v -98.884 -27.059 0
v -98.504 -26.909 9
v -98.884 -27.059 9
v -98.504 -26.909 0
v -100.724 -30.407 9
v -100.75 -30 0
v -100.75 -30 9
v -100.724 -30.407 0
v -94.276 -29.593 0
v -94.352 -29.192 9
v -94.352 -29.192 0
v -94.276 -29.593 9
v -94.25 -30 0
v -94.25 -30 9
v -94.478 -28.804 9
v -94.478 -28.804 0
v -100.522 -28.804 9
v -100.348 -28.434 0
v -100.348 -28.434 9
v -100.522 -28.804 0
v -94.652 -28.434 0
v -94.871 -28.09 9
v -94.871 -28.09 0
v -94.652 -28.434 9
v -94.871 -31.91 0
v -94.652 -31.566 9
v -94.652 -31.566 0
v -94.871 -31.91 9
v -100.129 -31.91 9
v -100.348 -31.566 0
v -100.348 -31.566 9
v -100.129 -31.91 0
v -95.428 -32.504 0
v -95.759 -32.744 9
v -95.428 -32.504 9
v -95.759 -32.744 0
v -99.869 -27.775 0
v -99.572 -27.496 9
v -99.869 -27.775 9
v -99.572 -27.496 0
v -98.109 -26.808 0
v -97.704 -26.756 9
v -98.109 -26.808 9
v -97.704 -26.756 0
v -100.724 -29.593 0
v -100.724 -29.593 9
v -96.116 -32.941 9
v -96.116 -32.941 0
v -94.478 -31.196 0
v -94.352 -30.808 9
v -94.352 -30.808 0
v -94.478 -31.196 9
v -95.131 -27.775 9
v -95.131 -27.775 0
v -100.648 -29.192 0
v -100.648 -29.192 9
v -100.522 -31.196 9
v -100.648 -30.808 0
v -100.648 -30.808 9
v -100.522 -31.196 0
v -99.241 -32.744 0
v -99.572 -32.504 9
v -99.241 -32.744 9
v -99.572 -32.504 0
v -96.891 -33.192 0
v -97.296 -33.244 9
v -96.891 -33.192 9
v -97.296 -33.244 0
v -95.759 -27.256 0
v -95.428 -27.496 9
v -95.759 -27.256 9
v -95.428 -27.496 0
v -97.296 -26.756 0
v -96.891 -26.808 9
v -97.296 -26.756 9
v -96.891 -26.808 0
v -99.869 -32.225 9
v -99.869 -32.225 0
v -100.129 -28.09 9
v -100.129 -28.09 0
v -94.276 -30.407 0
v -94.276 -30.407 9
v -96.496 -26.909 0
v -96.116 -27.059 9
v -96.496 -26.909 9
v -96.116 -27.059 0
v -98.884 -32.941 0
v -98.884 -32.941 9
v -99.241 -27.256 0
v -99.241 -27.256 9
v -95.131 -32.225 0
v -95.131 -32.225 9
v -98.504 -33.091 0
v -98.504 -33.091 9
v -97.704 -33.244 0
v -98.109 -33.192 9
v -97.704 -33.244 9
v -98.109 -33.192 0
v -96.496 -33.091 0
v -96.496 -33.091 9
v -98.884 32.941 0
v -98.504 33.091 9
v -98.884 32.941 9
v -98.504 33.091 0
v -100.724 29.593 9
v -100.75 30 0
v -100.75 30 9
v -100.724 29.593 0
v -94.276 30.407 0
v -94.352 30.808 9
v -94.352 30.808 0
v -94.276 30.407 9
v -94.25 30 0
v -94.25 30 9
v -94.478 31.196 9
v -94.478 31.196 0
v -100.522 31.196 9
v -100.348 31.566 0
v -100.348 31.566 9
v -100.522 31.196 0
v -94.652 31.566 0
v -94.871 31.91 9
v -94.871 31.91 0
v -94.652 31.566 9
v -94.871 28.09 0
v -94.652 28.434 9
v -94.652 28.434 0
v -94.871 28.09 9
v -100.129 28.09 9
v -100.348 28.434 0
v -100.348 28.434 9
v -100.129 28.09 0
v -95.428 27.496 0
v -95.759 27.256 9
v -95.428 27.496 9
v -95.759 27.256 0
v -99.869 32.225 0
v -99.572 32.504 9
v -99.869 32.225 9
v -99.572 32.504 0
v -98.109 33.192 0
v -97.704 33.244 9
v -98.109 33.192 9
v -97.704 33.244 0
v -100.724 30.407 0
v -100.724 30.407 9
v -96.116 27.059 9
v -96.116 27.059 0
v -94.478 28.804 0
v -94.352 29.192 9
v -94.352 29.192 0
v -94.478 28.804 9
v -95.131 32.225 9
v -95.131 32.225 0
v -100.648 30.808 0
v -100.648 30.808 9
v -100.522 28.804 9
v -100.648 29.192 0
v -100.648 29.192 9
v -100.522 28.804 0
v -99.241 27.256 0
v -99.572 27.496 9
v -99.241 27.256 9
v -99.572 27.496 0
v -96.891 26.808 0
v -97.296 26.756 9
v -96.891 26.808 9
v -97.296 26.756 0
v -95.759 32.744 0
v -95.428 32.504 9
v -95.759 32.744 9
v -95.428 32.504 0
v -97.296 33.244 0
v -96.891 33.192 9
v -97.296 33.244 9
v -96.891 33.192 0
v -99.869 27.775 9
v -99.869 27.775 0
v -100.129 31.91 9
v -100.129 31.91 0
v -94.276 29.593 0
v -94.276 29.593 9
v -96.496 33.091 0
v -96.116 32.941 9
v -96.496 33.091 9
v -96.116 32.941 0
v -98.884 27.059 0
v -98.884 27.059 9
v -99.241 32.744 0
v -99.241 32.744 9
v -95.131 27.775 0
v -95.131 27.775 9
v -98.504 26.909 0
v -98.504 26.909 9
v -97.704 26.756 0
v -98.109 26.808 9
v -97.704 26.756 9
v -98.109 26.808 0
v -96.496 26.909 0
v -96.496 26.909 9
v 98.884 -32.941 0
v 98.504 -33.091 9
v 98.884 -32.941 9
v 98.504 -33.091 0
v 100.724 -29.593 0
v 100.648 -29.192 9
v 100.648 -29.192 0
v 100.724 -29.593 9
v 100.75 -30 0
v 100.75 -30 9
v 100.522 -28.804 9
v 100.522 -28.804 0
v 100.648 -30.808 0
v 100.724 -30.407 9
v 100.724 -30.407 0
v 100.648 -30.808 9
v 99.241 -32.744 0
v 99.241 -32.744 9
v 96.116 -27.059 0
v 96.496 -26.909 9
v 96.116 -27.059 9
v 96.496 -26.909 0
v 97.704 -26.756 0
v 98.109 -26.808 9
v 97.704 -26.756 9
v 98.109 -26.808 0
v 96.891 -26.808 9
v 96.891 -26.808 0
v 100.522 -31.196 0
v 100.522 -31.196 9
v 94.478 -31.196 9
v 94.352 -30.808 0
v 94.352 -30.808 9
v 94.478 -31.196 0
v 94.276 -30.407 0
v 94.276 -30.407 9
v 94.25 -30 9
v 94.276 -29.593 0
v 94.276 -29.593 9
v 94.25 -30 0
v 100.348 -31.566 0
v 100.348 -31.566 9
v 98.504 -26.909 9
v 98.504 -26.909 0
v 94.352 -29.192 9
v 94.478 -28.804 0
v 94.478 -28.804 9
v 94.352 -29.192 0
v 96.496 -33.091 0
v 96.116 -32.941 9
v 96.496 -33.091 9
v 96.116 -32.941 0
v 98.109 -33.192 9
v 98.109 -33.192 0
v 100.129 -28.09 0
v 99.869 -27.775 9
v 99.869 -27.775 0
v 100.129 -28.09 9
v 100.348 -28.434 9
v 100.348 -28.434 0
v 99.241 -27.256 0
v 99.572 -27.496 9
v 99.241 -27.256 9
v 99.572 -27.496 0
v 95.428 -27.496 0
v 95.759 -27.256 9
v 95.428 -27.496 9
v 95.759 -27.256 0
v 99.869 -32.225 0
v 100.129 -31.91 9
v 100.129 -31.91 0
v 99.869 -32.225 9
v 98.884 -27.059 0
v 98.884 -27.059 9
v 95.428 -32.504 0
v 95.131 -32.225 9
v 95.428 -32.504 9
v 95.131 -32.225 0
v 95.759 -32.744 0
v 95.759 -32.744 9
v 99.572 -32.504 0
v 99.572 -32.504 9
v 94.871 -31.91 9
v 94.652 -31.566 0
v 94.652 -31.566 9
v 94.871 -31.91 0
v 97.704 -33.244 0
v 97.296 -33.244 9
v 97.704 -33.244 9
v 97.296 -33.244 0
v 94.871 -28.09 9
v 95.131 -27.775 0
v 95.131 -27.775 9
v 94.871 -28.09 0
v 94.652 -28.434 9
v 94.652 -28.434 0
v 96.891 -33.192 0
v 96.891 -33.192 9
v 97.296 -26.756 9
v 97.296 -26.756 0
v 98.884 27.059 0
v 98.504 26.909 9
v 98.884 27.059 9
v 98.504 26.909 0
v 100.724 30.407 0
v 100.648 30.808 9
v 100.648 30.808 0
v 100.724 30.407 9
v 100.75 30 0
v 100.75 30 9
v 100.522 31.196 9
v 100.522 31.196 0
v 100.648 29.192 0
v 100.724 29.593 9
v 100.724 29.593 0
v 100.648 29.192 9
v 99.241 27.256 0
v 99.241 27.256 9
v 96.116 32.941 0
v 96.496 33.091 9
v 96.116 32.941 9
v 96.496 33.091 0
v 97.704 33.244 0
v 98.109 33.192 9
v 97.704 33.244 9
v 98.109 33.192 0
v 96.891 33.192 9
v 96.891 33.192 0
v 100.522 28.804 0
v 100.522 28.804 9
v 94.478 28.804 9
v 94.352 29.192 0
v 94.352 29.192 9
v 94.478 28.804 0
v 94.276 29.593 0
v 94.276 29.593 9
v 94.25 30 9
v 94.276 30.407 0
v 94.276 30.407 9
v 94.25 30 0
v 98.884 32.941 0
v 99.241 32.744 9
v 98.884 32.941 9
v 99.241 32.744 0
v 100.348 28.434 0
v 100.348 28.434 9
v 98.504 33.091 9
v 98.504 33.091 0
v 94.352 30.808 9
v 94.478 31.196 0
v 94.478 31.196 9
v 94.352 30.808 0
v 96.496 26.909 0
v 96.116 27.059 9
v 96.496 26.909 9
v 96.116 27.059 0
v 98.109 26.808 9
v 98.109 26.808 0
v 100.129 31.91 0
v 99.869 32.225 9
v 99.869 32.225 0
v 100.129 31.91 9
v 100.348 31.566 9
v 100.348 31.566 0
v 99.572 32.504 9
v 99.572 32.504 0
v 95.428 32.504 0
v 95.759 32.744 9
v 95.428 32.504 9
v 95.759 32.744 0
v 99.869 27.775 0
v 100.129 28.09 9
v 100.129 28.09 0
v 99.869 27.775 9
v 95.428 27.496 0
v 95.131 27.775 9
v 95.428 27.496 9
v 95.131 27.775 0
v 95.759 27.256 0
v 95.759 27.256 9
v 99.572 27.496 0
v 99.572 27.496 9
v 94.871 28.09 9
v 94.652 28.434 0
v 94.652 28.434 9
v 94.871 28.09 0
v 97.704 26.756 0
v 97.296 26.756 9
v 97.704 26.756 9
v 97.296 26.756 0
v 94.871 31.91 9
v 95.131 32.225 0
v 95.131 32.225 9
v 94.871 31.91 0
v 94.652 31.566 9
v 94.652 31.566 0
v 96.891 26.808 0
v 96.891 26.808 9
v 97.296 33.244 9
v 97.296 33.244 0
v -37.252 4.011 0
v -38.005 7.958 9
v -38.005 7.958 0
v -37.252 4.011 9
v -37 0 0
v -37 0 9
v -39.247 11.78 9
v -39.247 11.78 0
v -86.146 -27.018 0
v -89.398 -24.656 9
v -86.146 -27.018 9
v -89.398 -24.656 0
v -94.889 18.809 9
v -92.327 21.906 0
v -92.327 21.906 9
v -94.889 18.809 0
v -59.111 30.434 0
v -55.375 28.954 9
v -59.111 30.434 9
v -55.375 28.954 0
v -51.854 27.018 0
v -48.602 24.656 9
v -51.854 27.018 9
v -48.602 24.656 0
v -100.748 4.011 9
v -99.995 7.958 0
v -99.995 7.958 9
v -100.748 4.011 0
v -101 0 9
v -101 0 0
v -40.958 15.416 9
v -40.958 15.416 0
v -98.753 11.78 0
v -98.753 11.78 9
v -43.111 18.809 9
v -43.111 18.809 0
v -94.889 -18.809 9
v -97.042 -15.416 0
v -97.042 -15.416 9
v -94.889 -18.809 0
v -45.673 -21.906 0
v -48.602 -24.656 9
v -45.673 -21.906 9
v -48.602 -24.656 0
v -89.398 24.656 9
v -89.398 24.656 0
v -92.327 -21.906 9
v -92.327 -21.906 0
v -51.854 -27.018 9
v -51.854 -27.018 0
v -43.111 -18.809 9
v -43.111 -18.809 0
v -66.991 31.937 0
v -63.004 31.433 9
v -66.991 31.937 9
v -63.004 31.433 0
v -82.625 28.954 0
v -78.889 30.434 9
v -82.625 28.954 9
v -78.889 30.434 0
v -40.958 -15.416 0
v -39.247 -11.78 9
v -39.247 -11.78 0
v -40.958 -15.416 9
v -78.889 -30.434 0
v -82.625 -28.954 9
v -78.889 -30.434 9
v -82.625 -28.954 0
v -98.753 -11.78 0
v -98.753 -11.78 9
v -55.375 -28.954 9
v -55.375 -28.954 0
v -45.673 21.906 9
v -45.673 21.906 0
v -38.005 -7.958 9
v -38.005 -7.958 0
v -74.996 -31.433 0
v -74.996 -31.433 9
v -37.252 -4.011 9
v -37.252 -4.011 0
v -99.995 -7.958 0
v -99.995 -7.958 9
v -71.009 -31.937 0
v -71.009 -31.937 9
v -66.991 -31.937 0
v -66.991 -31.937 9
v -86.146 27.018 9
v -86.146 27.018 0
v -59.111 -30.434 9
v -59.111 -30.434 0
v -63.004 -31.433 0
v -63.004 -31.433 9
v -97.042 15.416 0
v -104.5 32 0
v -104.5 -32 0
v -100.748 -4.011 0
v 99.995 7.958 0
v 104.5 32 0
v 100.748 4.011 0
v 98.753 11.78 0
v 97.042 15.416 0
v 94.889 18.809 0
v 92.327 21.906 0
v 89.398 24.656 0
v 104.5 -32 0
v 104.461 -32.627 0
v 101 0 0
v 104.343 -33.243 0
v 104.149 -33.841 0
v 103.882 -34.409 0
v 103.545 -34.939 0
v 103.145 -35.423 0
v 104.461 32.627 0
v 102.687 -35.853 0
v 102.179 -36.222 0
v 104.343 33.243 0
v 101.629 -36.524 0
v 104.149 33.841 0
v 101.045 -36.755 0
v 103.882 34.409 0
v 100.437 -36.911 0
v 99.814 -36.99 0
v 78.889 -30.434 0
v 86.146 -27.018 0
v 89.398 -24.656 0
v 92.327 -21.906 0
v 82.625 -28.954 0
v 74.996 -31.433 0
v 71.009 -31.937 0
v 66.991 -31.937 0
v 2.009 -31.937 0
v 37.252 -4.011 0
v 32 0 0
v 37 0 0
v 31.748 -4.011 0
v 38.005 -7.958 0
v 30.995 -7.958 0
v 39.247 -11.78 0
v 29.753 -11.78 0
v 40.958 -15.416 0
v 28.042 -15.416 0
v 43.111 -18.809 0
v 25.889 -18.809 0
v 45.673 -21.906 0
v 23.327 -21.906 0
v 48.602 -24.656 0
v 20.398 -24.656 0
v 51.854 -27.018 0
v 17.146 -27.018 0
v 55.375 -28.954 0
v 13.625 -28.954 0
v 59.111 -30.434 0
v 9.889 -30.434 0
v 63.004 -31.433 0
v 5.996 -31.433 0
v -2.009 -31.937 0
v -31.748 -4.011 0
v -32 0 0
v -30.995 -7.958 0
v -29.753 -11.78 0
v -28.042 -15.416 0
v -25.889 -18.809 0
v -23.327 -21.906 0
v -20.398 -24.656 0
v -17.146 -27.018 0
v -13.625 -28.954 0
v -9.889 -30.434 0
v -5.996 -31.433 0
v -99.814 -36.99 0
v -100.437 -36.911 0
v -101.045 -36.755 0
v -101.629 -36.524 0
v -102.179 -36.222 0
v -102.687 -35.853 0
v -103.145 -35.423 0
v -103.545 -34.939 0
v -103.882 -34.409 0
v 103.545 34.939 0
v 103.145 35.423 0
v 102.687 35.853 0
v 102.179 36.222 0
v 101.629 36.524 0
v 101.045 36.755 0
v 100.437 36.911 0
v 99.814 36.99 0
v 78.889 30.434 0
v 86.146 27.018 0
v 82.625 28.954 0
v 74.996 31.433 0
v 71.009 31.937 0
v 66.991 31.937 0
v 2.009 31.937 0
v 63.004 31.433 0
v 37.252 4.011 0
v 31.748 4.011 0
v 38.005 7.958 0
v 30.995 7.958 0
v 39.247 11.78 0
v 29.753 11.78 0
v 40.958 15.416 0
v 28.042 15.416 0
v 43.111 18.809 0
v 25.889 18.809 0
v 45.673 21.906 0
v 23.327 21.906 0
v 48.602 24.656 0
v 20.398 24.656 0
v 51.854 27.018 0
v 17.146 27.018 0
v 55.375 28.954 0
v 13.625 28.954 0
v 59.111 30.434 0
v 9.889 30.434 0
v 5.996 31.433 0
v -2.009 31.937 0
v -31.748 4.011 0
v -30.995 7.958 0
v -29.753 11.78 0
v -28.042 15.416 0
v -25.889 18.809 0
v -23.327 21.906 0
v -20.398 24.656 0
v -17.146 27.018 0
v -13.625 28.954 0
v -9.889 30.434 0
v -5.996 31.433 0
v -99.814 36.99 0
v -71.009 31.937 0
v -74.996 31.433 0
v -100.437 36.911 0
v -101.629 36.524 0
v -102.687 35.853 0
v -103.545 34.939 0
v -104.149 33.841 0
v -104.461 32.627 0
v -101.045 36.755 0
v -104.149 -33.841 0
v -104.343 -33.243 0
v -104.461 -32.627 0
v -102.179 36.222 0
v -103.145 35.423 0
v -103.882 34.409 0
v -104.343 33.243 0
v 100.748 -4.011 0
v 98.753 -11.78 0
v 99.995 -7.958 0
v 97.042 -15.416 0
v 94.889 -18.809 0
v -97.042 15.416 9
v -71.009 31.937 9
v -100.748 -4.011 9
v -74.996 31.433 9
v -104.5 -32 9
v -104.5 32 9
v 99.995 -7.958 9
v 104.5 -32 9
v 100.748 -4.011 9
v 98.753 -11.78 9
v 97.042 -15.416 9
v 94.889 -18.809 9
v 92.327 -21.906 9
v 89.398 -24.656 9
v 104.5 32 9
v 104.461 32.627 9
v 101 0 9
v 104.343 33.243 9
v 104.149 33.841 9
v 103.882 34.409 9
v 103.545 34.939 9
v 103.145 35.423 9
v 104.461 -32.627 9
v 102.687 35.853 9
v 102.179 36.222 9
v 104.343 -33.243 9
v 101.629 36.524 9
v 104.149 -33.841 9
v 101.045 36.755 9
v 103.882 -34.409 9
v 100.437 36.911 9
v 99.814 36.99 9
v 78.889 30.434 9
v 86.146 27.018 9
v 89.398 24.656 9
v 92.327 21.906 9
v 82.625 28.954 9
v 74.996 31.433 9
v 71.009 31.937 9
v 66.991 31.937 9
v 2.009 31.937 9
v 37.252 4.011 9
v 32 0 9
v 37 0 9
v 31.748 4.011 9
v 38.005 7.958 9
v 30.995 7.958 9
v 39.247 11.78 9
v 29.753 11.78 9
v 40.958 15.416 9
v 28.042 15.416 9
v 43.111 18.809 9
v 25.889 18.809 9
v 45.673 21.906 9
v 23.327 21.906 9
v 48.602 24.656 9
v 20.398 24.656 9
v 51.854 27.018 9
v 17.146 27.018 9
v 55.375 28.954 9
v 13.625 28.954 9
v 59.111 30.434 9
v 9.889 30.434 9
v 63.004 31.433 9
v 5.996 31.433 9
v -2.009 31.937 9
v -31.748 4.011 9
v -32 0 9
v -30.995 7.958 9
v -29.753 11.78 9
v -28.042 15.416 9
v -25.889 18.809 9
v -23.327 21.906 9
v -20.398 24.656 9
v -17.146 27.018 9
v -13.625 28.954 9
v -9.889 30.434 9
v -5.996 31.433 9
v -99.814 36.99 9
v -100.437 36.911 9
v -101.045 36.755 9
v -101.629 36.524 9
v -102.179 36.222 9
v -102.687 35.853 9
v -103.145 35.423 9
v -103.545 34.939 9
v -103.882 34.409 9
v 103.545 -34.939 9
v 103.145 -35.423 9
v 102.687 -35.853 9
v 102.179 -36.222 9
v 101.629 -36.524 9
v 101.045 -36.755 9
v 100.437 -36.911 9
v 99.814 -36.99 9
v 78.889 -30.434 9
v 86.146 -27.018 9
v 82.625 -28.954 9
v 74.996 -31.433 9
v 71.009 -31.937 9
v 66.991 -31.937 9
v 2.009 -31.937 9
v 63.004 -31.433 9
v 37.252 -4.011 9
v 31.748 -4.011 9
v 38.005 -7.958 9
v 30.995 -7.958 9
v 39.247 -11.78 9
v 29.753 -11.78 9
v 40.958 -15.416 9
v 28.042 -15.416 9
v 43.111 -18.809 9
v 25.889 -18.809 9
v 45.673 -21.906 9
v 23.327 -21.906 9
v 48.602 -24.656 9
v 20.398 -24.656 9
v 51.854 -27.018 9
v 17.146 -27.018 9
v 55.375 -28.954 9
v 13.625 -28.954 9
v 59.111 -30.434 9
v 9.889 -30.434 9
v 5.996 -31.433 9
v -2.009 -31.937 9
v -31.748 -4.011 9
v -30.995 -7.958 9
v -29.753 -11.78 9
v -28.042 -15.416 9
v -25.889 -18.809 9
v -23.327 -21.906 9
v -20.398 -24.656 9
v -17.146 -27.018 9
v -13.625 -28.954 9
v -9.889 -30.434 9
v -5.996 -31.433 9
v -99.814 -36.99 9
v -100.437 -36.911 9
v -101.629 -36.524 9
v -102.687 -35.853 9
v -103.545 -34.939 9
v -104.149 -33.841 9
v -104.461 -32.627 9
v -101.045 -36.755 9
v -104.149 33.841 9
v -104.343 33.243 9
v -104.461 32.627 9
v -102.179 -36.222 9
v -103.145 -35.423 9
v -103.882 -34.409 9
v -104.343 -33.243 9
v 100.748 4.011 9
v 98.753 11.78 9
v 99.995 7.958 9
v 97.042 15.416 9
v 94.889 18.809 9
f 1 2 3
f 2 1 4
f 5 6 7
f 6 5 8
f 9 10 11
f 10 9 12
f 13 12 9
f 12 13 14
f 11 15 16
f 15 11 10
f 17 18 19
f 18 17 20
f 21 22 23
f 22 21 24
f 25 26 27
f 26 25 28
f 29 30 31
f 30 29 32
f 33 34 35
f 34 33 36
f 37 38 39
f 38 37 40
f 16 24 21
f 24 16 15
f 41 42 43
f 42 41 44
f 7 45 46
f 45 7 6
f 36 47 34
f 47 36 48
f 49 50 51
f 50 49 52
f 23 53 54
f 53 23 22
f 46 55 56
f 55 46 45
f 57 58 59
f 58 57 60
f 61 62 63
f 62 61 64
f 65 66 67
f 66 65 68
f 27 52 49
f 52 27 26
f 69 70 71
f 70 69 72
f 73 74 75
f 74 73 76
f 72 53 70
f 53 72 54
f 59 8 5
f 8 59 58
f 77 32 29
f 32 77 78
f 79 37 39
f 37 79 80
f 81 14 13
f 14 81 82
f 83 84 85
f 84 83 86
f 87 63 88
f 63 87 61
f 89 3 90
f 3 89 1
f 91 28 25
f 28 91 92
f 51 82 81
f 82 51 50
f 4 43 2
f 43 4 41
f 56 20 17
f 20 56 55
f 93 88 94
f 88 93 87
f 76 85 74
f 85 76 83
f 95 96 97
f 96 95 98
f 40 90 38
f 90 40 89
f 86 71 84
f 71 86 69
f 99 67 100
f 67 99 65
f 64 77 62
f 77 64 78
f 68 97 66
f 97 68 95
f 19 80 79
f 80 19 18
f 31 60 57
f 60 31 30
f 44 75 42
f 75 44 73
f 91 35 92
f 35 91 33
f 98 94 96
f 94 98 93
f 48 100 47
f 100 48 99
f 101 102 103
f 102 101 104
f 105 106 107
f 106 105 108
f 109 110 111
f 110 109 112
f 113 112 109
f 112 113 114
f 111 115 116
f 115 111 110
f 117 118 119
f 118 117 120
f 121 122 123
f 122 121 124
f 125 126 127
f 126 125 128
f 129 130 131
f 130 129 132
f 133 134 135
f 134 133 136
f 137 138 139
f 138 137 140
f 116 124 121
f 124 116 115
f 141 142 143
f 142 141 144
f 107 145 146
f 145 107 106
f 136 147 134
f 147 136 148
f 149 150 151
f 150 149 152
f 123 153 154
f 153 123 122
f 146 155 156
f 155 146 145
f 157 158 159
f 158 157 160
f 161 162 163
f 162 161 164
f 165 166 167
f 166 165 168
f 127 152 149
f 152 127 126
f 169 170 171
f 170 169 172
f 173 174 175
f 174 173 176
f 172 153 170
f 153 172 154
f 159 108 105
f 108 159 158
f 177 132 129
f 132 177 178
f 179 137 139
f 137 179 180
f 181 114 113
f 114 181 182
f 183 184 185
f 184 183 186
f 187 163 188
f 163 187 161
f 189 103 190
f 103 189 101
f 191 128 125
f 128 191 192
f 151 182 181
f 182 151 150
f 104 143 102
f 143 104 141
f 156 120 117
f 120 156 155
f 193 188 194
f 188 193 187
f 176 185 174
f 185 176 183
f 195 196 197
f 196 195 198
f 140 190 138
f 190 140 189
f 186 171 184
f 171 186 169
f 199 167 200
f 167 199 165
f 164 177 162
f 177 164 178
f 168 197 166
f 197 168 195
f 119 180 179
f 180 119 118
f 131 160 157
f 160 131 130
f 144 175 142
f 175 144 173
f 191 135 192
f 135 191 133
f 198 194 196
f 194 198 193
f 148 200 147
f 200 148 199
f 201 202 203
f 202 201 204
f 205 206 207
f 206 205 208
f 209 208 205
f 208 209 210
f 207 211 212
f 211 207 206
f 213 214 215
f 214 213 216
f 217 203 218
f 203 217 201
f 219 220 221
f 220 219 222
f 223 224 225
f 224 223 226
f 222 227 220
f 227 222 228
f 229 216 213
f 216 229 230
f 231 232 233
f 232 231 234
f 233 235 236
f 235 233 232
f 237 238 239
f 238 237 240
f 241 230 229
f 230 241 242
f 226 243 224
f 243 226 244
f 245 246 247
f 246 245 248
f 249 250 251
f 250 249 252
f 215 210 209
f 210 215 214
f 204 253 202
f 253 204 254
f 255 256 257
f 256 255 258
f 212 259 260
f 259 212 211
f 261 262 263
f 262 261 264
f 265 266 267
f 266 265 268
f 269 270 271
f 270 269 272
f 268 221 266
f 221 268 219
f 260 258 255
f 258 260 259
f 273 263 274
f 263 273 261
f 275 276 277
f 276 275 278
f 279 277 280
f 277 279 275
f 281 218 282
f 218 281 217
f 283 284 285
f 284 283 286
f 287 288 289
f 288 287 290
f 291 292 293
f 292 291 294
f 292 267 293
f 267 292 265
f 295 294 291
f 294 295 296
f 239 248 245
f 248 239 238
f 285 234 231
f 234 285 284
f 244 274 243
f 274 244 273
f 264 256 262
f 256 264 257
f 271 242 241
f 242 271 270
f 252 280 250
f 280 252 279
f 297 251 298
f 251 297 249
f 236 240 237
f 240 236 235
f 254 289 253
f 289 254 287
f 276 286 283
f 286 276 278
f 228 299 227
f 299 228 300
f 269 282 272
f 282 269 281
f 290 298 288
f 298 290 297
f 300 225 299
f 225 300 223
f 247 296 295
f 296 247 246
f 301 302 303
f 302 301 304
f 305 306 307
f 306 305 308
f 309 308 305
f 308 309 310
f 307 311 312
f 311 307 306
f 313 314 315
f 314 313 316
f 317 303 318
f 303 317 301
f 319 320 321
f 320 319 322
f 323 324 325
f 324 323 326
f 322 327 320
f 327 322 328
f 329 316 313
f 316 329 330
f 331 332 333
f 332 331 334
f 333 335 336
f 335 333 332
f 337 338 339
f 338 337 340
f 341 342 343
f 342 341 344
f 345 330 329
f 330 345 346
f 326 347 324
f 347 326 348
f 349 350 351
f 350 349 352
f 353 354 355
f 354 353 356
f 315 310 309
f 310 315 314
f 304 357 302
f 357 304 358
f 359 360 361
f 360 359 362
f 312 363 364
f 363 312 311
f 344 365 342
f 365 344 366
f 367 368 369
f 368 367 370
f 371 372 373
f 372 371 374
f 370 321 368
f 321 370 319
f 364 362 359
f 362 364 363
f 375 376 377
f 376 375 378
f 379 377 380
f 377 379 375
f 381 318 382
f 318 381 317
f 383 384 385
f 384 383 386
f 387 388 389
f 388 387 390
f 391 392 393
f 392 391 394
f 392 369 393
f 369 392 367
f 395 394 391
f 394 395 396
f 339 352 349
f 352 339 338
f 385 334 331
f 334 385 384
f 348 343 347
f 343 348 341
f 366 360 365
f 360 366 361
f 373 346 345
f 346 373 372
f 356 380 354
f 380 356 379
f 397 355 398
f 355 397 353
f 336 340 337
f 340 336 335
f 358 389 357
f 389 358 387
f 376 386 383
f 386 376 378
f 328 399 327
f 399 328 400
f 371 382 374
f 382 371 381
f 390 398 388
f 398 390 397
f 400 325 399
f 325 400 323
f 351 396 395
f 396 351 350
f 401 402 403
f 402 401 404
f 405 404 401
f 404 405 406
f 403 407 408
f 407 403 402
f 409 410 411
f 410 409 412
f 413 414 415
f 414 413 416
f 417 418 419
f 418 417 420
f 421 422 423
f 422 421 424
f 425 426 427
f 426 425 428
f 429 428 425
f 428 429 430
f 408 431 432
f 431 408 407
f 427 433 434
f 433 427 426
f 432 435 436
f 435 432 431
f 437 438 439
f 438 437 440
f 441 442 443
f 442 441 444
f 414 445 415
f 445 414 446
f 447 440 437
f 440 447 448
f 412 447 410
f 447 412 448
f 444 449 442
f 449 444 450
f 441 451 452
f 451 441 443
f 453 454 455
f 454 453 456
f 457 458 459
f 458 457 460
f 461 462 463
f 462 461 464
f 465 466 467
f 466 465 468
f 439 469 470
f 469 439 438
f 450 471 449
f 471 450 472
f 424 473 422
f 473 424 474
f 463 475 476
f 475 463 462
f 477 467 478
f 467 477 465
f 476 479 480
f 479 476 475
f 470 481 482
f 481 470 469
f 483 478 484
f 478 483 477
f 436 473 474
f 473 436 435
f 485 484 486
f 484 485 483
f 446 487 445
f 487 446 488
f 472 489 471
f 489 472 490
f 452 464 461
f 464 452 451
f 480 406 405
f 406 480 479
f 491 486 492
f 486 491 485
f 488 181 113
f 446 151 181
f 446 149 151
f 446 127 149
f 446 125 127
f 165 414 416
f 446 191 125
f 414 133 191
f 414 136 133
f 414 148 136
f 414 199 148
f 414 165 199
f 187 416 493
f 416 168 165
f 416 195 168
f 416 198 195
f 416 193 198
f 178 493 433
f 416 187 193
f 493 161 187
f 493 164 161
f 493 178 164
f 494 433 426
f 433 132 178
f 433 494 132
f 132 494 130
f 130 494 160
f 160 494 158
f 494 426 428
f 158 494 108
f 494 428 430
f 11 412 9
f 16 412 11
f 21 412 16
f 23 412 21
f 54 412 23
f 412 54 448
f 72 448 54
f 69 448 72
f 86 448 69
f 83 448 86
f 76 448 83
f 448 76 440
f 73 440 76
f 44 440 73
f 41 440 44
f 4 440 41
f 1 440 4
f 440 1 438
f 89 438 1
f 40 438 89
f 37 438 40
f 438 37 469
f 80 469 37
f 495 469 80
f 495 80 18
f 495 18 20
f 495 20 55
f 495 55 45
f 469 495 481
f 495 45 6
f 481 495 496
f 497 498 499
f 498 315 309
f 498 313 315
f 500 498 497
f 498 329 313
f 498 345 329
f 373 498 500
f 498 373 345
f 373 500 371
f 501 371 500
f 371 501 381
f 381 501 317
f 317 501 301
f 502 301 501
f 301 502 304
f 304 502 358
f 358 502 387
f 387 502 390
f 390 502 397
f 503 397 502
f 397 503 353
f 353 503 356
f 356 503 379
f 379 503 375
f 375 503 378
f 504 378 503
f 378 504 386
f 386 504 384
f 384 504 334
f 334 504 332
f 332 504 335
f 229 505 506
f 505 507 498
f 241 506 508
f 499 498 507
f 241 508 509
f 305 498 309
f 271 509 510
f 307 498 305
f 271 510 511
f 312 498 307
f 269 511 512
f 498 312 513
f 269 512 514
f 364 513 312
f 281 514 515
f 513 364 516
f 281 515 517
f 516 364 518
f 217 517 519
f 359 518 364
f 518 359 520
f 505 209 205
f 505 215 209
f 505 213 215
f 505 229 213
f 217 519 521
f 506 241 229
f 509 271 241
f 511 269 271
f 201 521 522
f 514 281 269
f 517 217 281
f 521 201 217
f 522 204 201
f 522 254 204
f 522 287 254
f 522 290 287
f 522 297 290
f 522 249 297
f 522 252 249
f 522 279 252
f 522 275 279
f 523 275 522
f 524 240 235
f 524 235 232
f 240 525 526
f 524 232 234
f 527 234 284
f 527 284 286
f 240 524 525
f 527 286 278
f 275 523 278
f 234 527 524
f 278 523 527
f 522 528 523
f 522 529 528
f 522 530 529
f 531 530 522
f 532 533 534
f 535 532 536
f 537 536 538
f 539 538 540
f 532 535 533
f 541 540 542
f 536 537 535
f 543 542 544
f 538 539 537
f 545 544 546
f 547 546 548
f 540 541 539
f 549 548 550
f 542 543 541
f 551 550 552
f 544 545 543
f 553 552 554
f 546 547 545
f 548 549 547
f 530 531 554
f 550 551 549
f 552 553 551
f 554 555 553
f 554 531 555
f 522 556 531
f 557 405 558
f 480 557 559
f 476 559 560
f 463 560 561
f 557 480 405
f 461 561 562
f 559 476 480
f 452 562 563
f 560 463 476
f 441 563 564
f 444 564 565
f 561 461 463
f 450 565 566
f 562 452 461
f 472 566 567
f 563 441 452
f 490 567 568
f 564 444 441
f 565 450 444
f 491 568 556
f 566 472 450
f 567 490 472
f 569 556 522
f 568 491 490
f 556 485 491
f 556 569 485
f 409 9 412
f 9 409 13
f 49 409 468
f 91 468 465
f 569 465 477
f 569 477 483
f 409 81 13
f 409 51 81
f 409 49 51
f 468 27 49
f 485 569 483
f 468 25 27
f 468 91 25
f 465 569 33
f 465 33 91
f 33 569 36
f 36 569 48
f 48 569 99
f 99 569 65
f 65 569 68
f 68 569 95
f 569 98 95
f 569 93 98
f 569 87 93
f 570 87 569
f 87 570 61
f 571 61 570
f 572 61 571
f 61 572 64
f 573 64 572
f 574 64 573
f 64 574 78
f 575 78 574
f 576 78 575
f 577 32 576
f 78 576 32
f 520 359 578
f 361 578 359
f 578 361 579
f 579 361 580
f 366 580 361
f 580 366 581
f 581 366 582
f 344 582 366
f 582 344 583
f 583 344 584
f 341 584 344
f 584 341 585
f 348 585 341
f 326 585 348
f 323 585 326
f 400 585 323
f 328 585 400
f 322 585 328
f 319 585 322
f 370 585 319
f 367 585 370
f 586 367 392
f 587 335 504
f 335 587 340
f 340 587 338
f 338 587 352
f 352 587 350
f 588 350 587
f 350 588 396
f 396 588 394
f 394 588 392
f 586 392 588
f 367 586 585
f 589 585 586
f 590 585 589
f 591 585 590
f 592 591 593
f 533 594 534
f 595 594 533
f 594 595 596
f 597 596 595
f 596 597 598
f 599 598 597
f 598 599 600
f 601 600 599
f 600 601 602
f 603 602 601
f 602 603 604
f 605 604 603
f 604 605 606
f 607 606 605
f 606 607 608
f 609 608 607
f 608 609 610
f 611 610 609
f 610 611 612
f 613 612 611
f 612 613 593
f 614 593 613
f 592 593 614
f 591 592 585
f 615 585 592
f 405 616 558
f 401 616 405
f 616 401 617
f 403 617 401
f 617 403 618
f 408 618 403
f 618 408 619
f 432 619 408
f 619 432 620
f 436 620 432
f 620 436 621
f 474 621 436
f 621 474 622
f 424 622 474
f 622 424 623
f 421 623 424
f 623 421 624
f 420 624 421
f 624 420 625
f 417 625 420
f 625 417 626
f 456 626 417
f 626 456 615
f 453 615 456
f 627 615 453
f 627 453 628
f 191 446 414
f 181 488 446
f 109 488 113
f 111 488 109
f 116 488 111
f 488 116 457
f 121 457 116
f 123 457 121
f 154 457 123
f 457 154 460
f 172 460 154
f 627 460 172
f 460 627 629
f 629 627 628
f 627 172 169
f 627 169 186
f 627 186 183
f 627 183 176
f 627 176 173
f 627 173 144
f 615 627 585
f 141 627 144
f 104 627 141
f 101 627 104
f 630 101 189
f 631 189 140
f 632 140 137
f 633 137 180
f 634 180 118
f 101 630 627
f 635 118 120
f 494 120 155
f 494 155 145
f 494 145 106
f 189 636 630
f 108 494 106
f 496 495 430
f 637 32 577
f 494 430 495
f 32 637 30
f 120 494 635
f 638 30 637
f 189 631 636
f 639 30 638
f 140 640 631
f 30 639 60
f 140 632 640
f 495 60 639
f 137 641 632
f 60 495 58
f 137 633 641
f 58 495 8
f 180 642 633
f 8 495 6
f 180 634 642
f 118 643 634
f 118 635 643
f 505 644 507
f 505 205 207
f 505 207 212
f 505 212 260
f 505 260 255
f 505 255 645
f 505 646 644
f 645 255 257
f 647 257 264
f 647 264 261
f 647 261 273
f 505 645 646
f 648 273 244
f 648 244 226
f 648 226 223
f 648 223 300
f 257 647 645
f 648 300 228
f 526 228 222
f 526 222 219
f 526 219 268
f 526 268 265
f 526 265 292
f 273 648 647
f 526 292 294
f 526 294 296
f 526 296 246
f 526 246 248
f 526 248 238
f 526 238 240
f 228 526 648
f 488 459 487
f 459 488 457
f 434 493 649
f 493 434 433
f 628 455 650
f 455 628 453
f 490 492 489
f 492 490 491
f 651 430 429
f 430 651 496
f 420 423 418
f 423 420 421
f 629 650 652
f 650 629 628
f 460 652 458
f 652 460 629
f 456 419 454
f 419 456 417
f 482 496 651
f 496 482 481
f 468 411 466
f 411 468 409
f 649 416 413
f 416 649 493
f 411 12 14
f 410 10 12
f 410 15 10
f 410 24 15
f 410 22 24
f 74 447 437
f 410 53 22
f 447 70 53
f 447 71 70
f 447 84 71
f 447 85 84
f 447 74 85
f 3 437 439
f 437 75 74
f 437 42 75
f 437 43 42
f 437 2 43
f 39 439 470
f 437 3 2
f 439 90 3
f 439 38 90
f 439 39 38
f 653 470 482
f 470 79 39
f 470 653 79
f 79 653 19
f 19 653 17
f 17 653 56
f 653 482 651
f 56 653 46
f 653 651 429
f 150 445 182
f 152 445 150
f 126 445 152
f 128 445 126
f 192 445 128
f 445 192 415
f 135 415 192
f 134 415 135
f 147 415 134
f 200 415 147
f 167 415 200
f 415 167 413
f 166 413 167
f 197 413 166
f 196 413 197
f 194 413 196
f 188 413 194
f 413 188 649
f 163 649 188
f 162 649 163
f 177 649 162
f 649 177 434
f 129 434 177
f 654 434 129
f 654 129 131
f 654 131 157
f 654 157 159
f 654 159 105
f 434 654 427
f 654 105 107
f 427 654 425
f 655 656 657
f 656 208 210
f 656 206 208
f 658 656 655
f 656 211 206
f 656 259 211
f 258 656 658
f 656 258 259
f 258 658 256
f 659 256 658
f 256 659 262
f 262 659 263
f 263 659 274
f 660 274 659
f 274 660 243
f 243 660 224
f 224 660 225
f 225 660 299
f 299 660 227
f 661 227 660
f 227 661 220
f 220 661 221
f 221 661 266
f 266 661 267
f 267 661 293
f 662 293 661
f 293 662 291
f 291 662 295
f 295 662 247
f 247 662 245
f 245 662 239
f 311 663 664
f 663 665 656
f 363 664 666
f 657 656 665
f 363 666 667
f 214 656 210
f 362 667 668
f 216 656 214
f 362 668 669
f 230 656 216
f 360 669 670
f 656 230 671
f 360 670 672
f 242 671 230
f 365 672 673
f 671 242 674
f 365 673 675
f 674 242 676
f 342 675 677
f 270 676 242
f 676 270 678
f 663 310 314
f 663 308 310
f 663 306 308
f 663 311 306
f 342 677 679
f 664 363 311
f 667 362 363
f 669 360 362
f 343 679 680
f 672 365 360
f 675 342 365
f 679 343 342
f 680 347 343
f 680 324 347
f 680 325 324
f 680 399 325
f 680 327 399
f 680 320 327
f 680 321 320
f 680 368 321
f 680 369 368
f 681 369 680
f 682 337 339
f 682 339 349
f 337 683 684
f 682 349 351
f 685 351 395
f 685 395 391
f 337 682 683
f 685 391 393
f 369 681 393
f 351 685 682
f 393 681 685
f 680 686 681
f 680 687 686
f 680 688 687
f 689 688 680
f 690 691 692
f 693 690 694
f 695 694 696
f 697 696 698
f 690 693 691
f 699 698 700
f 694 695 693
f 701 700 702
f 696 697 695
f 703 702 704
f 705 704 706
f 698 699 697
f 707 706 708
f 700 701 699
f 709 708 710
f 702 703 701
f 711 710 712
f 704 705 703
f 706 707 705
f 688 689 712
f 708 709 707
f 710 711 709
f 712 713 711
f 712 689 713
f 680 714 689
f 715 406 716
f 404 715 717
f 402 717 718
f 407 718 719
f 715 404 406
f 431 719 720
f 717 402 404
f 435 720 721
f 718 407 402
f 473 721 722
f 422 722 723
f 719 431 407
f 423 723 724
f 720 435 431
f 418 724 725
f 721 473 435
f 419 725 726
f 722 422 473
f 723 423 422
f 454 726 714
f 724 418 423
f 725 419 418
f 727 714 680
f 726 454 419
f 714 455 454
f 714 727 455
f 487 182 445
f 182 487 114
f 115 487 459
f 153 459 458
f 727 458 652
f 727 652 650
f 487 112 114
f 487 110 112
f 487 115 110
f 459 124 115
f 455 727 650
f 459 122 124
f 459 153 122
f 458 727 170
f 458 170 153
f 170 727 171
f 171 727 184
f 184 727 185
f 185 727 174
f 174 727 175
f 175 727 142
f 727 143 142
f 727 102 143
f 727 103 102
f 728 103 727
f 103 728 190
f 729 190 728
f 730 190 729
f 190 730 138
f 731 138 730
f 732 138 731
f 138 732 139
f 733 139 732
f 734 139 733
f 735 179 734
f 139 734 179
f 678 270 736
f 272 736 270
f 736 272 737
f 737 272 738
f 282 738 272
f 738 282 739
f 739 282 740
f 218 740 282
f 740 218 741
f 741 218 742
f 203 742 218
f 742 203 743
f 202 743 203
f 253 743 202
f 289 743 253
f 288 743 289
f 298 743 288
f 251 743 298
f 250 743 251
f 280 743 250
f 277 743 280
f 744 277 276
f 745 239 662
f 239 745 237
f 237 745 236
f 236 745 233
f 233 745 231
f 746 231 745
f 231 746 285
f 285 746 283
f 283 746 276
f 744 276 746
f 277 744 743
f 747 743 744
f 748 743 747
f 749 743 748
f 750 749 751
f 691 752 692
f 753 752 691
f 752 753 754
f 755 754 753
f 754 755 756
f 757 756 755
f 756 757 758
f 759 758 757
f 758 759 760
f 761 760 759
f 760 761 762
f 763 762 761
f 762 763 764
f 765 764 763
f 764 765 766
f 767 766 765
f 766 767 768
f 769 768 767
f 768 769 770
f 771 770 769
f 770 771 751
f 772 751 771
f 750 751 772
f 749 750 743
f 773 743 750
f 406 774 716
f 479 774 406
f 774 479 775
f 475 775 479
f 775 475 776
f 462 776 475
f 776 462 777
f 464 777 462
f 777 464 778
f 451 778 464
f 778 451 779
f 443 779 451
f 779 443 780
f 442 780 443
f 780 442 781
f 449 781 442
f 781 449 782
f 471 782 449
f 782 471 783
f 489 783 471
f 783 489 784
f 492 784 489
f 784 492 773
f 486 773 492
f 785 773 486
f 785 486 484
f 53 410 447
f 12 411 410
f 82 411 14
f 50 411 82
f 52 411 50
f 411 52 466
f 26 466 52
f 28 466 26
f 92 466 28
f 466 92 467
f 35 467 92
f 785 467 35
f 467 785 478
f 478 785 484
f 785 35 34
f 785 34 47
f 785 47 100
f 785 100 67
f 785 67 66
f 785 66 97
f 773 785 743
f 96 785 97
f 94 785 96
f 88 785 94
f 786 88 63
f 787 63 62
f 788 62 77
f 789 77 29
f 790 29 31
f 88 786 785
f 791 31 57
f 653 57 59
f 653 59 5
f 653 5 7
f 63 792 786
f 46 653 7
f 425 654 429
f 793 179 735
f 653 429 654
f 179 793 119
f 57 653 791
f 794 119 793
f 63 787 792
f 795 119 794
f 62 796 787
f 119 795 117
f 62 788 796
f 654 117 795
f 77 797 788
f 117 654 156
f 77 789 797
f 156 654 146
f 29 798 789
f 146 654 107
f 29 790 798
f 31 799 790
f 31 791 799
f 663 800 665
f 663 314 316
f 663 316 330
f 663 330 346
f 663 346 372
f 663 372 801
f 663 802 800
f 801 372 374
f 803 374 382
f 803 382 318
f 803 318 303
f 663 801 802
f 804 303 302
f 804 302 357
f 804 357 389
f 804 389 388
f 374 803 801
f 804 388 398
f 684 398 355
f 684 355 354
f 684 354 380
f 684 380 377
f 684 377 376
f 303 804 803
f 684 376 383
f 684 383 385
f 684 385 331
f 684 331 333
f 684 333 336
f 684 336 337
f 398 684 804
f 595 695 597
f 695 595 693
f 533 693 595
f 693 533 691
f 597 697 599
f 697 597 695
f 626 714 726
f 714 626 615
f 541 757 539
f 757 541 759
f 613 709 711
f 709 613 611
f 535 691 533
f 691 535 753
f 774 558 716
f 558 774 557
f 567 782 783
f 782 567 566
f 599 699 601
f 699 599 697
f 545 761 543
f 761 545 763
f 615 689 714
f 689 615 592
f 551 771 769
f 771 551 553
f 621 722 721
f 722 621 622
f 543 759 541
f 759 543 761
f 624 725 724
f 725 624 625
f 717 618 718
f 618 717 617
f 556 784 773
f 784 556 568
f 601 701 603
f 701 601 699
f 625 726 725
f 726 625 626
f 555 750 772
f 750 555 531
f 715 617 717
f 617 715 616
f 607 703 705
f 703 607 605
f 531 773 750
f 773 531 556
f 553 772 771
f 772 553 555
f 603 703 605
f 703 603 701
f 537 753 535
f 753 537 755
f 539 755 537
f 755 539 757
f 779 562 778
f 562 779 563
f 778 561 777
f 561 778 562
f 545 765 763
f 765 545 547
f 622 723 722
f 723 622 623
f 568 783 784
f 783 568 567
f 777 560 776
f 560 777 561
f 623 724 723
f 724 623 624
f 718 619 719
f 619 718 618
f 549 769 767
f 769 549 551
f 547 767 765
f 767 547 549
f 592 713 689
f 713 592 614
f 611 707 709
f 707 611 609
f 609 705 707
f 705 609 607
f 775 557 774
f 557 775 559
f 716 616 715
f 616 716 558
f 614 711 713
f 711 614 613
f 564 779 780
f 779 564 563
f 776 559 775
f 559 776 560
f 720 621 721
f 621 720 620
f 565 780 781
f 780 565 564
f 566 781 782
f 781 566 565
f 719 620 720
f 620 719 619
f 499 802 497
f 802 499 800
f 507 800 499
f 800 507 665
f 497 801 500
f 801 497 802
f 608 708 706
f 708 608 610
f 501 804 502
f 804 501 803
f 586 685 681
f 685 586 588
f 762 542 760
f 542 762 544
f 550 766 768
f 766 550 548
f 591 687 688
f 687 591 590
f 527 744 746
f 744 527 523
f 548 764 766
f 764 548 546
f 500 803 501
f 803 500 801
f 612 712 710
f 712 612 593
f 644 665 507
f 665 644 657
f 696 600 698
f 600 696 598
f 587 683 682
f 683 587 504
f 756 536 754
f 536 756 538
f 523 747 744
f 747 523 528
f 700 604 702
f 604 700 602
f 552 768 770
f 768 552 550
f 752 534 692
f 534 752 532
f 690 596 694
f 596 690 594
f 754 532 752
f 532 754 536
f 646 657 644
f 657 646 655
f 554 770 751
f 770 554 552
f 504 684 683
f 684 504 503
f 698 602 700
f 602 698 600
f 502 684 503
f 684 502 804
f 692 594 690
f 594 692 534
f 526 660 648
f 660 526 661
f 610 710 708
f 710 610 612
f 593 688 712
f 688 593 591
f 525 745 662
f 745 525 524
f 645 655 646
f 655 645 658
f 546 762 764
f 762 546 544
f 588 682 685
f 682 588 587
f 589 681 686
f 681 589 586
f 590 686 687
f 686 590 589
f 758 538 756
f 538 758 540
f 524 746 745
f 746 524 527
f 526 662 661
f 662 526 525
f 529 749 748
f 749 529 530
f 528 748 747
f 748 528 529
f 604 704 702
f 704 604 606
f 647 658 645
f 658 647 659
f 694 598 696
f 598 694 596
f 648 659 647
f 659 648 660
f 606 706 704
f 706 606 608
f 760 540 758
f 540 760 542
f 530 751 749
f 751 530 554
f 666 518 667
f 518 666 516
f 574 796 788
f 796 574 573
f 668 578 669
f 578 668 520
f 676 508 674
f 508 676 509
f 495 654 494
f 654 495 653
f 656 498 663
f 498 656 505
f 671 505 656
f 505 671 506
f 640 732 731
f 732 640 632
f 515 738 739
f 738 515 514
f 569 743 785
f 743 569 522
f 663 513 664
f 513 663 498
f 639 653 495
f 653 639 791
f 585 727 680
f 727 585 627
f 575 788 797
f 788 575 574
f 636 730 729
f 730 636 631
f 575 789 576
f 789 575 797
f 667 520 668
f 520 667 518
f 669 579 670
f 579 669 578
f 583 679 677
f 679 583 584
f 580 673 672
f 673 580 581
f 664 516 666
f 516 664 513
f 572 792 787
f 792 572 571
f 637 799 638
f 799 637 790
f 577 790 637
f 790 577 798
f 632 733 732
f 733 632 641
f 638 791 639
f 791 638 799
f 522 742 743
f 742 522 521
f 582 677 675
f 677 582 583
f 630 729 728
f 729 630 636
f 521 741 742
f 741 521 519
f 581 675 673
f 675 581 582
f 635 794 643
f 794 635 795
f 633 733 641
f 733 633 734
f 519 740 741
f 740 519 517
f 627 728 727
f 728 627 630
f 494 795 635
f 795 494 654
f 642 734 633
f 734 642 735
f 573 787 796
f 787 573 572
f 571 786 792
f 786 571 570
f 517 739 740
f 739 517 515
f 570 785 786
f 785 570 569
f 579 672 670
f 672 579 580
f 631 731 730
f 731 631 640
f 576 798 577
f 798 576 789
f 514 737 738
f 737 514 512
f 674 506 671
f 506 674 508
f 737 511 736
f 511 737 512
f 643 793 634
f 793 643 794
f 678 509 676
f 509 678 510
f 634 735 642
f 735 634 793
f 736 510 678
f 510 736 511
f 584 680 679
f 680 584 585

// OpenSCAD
$fn = 50;


difference() {
	union() {
		hull() {
			translate(v = [-99.5000000000, 32.0000000000, 0]) {
				cylinder(h = 9, r = 5);
			}
			translate(v = [99.5000000000, 32.0000000000, 0]) {
				cylinder(h = 9, r = 5);
			}
			translate(v = [-99.5000000000, -32.0000000000, 0]) {
				cylinder(h = 9, r = 5);
			}
			translate(v = [99.5000000000, -32.0000000000, 0]) {
				cylinder(h = 9, r = 5);
			}
		}
	}
	union() {
		#translate(v = [-97.5000000000, -30.0000000000, -100.0000000000]) {
			cylinder(h = 200, r = 3.2500000000);
		}
		#translate(v = [-97.5000000000, 30.0000000000, -100.0000000000]) {
			cylinder(h = 200, r = 3.2500000000);
		}
		#translate(v = [97.5000000000, -30.0000000000, -100.0000000000]) {
			cylinder(h = 200, r = 3.2500000000);
		}
		#translate(v = [97.5000000000, 30.0000000000, -100.0000000000]) {
			cylinder(h = 200, r = 3.2500000000);
		}
		#translate(v = [-69.0000000000, 0, 0]) {
			cylinder(h = 9, r = 32.0000000000);
		}
		#cylinder(h = 9, r = 32.0000000000);
		#translate(v = [69.0000000000, 0, 0]) {
			cylinder(h = 9, r = 32.0000000000);
		}
	}
}
